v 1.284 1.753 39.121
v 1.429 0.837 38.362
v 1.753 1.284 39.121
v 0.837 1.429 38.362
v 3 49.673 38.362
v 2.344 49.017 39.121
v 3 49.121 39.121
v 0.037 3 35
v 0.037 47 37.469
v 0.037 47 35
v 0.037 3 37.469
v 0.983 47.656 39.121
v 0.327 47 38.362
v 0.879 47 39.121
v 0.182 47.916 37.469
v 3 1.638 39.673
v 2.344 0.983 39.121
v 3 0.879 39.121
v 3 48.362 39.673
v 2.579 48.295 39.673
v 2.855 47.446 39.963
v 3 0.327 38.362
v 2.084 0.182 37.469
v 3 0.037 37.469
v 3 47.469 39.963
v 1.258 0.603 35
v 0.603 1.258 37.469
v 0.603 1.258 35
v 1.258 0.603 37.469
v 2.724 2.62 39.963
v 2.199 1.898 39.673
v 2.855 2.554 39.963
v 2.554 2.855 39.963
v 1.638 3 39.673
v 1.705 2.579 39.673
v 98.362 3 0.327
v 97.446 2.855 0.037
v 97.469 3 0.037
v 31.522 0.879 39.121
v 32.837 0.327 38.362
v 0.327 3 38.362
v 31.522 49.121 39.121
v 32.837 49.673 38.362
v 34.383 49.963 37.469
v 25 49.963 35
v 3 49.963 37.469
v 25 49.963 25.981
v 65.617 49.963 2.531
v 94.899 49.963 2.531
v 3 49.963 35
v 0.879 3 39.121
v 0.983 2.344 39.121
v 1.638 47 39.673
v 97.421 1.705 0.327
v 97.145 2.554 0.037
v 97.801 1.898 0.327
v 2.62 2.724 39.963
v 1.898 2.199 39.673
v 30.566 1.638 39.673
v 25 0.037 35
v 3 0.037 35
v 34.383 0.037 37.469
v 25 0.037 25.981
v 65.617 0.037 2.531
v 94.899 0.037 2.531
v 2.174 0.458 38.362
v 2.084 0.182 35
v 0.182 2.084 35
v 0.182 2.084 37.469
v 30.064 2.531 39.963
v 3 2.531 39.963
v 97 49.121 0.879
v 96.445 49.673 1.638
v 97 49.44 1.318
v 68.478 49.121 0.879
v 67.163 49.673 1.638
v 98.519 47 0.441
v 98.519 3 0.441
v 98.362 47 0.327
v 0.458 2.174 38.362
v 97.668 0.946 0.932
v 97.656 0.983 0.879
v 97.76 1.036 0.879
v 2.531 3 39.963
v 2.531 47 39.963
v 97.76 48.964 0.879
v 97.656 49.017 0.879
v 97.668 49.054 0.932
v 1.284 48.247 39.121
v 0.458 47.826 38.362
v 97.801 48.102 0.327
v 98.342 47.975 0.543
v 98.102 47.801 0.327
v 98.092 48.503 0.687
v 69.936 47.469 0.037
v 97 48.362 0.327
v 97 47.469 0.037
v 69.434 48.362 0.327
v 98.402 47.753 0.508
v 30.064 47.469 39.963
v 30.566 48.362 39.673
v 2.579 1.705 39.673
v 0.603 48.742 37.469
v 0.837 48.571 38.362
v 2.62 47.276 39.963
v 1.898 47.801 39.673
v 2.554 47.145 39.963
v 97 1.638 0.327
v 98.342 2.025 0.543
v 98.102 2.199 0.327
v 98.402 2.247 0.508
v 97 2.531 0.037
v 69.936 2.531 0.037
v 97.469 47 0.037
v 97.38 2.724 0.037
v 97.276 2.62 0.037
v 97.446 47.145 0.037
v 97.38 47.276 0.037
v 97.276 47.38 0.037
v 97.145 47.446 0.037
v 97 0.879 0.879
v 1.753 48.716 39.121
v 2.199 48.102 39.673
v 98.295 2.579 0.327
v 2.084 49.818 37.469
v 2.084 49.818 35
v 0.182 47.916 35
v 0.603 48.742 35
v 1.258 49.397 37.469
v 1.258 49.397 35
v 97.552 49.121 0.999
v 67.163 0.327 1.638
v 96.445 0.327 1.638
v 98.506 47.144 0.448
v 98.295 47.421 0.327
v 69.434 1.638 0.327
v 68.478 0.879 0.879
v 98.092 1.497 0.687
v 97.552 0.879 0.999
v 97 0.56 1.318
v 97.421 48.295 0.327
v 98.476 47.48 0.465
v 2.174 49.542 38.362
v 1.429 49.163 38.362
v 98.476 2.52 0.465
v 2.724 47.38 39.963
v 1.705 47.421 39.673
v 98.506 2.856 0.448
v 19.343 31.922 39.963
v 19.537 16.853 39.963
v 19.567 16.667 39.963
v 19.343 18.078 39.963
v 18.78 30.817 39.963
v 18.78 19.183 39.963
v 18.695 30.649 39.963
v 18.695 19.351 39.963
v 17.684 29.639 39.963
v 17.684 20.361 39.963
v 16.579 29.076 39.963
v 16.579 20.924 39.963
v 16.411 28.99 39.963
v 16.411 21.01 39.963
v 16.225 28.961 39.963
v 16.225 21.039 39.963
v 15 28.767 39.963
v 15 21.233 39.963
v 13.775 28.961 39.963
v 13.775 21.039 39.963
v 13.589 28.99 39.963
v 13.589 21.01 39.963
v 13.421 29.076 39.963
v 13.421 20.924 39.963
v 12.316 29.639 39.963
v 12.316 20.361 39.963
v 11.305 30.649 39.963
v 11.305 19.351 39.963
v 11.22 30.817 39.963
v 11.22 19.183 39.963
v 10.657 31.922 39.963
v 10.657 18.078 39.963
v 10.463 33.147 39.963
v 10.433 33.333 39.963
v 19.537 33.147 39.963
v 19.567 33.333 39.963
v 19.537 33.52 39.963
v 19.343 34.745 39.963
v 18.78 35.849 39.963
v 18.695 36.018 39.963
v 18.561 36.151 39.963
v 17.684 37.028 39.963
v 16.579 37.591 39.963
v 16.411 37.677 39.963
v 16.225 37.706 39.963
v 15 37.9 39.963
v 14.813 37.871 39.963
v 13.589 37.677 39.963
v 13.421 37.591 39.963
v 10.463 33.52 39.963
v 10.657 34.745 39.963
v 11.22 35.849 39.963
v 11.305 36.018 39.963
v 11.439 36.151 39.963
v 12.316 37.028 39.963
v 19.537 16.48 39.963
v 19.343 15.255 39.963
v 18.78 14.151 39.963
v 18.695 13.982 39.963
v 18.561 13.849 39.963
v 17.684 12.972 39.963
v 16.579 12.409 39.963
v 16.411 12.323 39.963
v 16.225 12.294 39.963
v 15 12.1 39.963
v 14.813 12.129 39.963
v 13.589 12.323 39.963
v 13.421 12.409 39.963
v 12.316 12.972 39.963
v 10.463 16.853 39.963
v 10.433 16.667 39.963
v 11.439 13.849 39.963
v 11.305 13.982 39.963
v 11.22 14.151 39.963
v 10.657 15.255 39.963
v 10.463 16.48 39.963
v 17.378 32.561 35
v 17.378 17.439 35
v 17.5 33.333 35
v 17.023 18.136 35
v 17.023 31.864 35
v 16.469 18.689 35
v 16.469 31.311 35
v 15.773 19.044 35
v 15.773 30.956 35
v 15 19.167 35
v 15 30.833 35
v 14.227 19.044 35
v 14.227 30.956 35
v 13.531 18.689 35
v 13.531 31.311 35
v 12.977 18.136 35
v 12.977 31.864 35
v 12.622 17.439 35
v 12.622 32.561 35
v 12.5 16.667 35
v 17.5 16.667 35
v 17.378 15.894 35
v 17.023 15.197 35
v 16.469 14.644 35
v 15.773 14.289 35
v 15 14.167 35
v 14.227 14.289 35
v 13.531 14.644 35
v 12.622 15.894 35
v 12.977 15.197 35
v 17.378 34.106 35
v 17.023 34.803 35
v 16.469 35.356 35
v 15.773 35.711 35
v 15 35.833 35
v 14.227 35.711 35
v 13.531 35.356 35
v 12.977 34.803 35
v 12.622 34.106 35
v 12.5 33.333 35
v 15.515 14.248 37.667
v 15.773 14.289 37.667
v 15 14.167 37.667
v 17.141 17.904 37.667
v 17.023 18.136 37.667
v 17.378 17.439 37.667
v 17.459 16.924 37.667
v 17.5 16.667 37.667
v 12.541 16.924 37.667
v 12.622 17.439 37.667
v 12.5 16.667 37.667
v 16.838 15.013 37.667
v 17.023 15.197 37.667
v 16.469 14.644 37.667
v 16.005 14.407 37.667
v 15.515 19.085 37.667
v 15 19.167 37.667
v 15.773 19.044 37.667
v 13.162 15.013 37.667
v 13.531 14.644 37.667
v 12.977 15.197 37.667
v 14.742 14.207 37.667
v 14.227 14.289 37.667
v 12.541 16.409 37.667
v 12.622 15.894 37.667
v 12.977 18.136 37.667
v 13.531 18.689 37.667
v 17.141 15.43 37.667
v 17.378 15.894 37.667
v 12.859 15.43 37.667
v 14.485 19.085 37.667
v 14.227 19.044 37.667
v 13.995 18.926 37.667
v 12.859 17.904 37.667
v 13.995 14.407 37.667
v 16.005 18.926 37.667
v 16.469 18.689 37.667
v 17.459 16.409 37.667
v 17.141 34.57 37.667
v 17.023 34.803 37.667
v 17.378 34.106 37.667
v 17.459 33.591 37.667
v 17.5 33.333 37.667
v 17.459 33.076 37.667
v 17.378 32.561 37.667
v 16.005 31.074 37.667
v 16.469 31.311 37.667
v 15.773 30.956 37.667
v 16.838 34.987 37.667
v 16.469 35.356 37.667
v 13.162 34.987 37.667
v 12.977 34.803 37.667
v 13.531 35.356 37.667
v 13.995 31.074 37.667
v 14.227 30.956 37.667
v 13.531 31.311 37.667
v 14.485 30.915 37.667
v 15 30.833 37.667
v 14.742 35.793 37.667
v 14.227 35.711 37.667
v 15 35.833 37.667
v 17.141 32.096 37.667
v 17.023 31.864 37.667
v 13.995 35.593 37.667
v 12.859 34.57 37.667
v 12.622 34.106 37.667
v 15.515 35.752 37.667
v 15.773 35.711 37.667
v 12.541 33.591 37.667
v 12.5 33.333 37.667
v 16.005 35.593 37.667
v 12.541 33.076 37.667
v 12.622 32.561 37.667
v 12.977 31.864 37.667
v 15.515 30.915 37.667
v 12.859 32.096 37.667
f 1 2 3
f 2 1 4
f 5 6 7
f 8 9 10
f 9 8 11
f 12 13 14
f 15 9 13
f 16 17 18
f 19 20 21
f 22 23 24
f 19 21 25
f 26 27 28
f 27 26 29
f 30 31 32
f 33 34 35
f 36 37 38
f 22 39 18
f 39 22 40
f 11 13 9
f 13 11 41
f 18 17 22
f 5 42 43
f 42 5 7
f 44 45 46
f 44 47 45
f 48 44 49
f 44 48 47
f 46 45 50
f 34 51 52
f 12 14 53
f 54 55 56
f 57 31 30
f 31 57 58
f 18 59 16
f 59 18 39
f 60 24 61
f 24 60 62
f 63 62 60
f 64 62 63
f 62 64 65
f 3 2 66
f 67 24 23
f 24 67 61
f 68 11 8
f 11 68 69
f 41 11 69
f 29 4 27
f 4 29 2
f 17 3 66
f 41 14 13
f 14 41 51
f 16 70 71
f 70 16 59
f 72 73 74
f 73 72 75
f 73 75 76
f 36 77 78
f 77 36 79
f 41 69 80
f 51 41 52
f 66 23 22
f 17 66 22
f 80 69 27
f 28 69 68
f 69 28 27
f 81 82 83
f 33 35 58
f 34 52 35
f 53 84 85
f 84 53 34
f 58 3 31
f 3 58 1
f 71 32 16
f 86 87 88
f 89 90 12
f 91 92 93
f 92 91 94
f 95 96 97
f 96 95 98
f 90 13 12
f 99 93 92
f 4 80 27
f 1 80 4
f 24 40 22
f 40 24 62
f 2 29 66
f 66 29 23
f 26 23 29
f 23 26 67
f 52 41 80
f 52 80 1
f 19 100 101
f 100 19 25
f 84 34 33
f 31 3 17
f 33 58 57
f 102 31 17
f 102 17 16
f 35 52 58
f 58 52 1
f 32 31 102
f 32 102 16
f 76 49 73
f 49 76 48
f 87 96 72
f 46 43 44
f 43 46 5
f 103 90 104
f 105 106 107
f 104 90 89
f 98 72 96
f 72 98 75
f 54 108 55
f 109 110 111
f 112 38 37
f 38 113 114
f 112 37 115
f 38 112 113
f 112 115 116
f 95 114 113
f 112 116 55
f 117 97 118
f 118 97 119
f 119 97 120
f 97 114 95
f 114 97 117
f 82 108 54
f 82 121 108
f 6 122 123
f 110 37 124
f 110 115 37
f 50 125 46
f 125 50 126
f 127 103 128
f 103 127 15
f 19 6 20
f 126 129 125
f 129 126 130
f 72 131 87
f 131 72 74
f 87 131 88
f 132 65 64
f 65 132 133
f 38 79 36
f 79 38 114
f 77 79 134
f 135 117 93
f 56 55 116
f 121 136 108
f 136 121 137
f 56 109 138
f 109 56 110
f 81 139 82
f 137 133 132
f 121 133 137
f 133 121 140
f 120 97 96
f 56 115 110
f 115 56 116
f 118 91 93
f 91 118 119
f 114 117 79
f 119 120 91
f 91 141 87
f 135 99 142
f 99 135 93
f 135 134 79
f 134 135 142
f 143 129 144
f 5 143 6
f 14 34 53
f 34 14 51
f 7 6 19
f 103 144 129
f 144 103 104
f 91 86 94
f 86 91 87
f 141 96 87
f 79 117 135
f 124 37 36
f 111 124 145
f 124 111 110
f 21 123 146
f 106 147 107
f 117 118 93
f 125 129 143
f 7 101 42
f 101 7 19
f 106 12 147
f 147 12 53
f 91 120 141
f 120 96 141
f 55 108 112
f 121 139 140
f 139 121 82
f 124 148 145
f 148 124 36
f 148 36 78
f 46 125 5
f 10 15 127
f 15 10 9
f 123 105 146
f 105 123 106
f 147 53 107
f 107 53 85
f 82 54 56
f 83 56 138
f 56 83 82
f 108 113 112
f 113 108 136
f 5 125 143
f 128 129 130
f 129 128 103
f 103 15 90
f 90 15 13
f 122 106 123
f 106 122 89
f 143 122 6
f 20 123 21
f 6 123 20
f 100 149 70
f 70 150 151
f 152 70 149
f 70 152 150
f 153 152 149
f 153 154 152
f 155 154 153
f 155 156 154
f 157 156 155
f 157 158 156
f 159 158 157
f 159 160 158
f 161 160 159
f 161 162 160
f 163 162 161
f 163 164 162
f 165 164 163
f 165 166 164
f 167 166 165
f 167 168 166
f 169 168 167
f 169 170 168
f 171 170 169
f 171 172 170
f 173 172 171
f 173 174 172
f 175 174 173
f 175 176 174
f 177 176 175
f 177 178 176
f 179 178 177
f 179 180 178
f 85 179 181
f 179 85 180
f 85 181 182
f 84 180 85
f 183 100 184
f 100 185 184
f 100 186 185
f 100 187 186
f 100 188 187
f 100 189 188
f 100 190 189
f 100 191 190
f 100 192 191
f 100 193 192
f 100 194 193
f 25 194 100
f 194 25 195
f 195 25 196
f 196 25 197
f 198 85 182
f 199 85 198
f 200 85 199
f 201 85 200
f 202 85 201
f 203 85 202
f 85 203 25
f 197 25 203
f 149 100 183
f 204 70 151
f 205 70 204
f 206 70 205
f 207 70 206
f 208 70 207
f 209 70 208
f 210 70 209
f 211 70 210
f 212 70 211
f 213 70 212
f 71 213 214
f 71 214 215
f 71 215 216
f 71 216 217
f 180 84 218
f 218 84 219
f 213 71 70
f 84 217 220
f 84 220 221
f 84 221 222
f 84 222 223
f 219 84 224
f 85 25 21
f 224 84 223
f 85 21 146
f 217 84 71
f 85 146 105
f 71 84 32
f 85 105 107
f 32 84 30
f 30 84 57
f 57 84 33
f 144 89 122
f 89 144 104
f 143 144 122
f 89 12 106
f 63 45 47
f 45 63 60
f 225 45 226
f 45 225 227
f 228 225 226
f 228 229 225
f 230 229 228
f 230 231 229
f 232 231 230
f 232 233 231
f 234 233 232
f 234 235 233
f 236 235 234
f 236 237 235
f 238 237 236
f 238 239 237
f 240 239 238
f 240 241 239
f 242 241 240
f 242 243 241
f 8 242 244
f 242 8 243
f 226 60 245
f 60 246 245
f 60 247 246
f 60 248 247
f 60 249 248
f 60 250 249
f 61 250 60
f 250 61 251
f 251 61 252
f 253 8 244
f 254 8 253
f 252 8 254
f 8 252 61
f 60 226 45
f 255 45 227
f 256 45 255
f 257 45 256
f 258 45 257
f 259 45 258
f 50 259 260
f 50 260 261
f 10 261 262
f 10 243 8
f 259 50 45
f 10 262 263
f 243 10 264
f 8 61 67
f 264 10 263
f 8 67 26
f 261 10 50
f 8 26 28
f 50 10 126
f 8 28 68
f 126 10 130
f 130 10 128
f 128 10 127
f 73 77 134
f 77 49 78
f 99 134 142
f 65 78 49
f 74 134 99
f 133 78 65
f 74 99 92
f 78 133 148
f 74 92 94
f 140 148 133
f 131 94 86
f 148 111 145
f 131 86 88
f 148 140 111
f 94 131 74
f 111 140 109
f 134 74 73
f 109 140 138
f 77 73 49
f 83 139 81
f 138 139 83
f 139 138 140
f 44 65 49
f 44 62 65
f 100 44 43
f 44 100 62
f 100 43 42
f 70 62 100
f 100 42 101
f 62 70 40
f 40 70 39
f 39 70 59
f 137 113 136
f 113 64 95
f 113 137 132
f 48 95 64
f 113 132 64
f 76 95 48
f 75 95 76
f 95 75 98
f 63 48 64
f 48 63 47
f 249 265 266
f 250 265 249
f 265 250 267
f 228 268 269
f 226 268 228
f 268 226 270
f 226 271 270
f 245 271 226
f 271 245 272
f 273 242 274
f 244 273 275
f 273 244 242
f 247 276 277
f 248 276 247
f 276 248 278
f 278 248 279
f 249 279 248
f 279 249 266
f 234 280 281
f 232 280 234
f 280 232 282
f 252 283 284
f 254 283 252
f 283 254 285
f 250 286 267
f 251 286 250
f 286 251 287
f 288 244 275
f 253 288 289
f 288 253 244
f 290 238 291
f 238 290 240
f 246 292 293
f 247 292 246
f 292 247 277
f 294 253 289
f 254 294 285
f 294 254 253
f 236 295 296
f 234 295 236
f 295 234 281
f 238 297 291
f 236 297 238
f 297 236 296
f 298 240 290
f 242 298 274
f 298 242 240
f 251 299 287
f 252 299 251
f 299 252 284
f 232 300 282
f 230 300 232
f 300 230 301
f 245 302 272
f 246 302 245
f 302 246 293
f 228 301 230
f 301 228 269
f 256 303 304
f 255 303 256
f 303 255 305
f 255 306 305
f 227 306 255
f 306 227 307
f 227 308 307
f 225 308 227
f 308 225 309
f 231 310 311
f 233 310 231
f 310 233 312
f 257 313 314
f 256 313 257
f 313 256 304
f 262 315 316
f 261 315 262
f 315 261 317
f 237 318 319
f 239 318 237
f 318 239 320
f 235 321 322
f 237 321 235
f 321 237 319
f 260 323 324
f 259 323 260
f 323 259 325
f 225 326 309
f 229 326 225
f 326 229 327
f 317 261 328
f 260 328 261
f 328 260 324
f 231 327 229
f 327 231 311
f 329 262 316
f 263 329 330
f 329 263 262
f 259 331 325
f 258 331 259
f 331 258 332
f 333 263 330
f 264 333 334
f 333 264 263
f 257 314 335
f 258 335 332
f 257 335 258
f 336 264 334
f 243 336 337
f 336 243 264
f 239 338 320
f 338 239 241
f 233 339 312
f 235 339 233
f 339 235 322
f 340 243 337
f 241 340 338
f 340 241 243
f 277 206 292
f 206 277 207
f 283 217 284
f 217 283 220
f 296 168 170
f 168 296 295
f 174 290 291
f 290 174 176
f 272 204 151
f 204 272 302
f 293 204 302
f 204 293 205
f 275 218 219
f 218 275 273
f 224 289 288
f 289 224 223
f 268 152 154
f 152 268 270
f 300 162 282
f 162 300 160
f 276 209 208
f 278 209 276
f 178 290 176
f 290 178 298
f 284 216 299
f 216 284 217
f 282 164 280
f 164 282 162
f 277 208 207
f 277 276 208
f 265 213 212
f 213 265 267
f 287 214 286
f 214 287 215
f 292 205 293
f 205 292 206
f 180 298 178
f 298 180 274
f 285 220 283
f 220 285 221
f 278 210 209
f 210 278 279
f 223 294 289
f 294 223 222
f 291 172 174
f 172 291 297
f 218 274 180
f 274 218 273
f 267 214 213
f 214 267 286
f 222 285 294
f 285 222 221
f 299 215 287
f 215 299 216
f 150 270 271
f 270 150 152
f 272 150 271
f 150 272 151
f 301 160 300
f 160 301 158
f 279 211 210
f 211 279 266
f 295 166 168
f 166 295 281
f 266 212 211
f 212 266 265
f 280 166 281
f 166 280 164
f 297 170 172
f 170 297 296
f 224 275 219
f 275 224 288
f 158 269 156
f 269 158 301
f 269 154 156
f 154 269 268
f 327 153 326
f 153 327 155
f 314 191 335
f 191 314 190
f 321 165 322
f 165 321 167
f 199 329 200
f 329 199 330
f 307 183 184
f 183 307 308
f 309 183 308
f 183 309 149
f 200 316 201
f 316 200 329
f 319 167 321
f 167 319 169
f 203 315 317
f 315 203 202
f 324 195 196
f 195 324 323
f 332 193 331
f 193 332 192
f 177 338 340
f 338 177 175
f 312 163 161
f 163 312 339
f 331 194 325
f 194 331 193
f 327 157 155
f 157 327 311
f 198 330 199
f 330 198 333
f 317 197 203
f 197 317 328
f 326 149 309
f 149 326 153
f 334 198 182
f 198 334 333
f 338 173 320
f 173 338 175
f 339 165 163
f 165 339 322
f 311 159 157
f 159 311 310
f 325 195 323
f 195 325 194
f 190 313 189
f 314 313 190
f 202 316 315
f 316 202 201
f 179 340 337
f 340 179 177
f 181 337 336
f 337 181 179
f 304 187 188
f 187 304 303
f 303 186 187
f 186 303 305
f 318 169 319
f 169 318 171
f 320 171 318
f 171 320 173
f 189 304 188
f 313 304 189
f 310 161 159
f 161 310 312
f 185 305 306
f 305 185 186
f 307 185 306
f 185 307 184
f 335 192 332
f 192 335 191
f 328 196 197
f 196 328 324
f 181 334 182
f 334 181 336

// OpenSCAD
$fn = 20;


width = 50;
length = 100;
height = 40;
top_height = 5;

module rounded_box(x,y,z,r){
    translate([r,r,r])
    minkowski(){
        cube([x-r*2,y-r*2,z-r*2]);
        sphere(r=r, $fs=0.1);
    }
}

difference()
{
    rounded_box(length, width, height, 3);
    cube([length/4, width, height-top_height]);
    translate([length-70, 0, height]) rotate([0, 30, 0]) cube([length, width, height+10]);
    translate([length-90, 0, 0]) rotate([0, 30, 0]) cube([length/2+10, width, height-10]);
    translate([15, width/3, 25]) cylinder(h=20, d=5);
    translate([15, width/3*2, 25]) cylinder(h=20, d=5);
    translate([15, width/3, 46]) rotate([180, 0, 0])cylinder(10, 10);
    translate([15, width/3*2, 46]) rotate([180, 0, 0])cylinder(10, 10);
}
